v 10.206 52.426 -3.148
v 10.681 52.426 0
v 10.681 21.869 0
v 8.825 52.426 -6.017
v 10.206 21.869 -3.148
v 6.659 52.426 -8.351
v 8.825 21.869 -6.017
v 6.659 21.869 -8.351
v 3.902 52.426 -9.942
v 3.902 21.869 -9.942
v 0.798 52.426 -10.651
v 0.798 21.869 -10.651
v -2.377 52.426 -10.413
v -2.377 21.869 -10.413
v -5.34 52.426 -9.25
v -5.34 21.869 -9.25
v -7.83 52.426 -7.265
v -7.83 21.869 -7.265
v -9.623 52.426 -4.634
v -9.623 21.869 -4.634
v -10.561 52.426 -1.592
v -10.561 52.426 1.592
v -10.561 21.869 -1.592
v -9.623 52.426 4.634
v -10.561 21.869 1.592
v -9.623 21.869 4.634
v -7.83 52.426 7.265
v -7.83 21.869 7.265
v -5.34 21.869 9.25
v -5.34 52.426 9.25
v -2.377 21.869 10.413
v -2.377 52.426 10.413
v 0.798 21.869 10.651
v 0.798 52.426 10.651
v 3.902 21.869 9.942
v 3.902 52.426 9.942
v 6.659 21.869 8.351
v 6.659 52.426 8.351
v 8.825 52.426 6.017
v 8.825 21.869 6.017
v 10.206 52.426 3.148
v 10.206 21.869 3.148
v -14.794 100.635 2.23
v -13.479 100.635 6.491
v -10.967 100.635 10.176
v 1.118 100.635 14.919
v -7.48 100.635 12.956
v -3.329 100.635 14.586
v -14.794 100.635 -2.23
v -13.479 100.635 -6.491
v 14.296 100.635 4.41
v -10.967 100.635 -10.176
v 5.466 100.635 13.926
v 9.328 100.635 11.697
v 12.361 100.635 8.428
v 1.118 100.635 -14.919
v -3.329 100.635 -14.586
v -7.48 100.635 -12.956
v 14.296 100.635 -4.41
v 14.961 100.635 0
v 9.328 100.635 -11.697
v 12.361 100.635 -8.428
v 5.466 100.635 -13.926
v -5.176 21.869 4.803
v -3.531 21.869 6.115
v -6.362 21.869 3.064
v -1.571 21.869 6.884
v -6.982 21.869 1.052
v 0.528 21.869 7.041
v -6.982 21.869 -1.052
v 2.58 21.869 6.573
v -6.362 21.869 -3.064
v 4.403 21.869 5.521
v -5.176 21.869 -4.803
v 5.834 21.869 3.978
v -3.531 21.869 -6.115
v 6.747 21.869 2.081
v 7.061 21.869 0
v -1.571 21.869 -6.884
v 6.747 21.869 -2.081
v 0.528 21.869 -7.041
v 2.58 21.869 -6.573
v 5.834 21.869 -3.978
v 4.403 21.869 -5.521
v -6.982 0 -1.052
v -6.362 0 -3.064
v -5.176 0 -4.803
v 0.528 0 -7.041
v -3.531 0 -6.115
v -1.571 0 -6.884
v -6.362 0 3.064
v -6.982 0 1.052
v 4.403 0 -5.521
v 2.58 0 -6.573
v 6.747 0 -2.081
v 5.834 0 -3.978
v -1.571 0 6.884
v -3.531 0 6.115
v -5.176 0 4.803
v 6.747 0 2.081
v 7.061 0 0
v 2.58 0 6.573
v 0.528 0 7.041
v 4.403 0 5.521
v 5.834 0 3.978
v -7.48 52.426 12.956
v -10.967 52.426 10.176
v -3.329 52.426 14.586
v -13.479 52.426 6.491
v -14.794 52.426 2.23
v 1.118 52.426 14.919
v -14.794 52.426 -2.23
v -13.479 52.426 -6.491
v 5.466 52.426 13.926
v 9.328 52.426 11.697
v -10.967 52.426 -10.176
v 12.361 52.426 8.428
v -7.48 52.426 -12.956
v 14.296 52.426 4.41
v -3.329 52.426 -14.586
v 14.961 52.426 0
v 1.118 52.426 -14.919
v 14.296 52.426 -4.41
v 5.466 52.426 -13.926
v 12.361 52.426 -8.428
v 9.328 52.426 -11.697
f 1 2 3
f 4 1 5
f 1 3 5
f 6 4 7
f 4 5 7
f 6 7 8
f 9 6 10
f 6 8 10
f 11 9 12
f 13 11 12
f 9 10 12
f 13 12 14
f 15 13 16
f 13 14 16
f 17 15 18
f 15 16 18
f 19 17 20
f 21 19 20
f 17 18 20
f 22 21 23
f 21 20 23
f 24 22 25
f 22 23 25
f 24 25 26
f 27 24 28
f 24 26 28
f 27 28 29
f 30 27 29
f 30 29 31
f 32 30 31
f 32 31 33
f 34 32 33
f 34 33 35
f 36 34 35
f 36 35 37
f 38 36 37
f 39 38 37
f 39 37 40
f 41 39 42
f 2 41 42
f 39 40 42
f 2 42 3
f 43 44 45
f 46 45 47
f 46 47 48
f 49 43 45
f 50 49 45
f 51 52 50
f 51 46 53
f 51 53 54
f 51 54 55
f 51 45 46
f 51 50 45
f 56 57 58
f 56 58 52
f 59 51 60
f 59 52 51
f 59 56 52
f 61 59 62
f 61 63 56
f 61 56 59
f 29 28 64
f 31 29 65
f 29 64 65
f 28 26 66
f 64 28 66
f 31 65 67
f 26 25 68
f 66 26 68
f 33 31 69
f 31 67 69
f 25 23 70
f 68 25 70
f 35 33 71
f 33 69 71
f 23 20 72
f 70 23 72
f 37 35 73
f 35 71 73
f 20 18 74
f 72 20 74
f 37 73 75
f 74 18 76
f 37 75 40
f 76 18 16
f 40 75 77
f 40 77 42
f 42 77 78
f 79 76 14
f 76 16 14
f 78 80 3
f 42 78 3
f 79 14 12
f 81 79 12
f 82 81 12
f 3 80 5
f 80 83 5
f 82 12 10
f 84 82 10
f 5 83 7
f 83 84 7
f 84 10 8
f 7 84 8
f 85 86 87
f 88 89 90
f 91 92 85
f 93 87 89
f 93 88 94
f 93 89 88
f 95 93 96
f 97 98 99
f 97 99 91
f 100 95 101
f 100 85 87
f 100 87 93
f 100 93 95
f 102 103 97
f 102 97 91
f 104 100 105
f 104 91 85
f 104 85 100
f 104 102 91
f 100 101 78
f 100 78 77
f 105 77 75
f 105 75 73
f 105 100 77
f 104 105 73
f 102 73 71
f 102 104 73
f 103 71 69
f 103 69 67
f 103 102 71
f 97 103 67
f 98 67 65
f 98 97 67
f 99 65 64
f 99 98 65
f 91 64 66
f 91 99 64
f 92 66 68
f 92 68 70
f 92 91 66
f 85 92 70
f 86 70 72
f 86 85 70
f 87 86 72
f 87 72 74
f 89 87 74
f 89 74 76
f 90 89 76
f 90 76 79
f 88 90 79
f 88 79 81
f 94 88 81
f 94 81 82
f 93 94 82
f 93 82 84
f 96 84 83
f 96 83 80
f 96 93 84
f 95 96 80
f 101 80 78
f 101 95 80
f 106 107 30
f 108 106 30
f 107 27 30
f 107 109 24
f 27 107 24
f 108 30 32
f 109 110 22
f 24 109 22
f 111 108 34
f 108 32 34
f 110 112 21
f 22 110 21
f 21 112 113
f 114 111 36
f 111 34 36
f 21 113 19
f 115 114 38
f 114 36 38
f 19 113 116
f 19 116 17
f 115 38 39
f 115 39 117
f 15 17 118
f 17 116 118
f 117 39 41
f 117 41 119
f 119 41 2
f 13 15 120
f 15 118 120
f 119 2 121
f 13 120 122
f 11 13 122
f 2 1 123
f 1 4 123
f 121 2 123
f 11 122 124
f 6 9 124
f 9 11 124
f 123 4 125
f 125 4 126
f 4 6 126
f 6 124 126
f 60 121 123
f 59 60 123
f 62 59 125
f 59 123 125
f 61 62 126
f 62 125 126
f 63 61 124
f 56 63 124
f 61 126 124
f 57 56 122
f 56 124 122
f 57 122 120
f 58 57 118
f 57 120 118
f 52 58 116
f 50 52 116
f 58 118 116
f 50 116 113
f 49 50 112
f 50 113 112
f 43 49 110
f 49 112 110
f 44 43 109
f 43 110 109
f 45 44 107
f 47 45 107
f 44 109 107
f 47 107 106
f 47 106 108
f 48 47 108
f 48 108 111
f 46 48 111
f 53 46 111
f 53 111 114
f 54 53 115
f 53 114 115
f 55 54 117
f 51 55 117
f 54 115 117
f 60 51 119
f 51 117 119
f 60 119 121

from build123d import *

# Parameters (mm, degrees)
F0_R     = 7.0612
F1_DEPTH = 21.8694
F3_R     = 10.6807
F4_DEPTH = 30.5562
F6_R     = 14.9606
F7_DEPTH = 48.2092


with BuildPart() as f1:
    # F0 (on Front) → F1 (new body)
    with BuildSketch(Plane.XZ):
        Circle(F0_R)
    extrude(amount=-F1_DEPTH)

    # F3 (on offset) → F4 (join)
    with BuildSketch(Plane(origin=(0, 21.8694, 0), x_dir=(1, 0, 0), z_dir=(0, 1, 0))):
        Circle(F3_R)
    extrude(amount=F4_DEPTH)

    # F6 (on offset) → F7 (join)
    with BuildSketch(Plane(origin=(0, 52.4256, 0), x_dir=(1, 0, 0), z_dir=(0, 1, 0))):
        Circle(F6_R)
    extrude(amount=F7_DEPTH)


solid = f1.part
